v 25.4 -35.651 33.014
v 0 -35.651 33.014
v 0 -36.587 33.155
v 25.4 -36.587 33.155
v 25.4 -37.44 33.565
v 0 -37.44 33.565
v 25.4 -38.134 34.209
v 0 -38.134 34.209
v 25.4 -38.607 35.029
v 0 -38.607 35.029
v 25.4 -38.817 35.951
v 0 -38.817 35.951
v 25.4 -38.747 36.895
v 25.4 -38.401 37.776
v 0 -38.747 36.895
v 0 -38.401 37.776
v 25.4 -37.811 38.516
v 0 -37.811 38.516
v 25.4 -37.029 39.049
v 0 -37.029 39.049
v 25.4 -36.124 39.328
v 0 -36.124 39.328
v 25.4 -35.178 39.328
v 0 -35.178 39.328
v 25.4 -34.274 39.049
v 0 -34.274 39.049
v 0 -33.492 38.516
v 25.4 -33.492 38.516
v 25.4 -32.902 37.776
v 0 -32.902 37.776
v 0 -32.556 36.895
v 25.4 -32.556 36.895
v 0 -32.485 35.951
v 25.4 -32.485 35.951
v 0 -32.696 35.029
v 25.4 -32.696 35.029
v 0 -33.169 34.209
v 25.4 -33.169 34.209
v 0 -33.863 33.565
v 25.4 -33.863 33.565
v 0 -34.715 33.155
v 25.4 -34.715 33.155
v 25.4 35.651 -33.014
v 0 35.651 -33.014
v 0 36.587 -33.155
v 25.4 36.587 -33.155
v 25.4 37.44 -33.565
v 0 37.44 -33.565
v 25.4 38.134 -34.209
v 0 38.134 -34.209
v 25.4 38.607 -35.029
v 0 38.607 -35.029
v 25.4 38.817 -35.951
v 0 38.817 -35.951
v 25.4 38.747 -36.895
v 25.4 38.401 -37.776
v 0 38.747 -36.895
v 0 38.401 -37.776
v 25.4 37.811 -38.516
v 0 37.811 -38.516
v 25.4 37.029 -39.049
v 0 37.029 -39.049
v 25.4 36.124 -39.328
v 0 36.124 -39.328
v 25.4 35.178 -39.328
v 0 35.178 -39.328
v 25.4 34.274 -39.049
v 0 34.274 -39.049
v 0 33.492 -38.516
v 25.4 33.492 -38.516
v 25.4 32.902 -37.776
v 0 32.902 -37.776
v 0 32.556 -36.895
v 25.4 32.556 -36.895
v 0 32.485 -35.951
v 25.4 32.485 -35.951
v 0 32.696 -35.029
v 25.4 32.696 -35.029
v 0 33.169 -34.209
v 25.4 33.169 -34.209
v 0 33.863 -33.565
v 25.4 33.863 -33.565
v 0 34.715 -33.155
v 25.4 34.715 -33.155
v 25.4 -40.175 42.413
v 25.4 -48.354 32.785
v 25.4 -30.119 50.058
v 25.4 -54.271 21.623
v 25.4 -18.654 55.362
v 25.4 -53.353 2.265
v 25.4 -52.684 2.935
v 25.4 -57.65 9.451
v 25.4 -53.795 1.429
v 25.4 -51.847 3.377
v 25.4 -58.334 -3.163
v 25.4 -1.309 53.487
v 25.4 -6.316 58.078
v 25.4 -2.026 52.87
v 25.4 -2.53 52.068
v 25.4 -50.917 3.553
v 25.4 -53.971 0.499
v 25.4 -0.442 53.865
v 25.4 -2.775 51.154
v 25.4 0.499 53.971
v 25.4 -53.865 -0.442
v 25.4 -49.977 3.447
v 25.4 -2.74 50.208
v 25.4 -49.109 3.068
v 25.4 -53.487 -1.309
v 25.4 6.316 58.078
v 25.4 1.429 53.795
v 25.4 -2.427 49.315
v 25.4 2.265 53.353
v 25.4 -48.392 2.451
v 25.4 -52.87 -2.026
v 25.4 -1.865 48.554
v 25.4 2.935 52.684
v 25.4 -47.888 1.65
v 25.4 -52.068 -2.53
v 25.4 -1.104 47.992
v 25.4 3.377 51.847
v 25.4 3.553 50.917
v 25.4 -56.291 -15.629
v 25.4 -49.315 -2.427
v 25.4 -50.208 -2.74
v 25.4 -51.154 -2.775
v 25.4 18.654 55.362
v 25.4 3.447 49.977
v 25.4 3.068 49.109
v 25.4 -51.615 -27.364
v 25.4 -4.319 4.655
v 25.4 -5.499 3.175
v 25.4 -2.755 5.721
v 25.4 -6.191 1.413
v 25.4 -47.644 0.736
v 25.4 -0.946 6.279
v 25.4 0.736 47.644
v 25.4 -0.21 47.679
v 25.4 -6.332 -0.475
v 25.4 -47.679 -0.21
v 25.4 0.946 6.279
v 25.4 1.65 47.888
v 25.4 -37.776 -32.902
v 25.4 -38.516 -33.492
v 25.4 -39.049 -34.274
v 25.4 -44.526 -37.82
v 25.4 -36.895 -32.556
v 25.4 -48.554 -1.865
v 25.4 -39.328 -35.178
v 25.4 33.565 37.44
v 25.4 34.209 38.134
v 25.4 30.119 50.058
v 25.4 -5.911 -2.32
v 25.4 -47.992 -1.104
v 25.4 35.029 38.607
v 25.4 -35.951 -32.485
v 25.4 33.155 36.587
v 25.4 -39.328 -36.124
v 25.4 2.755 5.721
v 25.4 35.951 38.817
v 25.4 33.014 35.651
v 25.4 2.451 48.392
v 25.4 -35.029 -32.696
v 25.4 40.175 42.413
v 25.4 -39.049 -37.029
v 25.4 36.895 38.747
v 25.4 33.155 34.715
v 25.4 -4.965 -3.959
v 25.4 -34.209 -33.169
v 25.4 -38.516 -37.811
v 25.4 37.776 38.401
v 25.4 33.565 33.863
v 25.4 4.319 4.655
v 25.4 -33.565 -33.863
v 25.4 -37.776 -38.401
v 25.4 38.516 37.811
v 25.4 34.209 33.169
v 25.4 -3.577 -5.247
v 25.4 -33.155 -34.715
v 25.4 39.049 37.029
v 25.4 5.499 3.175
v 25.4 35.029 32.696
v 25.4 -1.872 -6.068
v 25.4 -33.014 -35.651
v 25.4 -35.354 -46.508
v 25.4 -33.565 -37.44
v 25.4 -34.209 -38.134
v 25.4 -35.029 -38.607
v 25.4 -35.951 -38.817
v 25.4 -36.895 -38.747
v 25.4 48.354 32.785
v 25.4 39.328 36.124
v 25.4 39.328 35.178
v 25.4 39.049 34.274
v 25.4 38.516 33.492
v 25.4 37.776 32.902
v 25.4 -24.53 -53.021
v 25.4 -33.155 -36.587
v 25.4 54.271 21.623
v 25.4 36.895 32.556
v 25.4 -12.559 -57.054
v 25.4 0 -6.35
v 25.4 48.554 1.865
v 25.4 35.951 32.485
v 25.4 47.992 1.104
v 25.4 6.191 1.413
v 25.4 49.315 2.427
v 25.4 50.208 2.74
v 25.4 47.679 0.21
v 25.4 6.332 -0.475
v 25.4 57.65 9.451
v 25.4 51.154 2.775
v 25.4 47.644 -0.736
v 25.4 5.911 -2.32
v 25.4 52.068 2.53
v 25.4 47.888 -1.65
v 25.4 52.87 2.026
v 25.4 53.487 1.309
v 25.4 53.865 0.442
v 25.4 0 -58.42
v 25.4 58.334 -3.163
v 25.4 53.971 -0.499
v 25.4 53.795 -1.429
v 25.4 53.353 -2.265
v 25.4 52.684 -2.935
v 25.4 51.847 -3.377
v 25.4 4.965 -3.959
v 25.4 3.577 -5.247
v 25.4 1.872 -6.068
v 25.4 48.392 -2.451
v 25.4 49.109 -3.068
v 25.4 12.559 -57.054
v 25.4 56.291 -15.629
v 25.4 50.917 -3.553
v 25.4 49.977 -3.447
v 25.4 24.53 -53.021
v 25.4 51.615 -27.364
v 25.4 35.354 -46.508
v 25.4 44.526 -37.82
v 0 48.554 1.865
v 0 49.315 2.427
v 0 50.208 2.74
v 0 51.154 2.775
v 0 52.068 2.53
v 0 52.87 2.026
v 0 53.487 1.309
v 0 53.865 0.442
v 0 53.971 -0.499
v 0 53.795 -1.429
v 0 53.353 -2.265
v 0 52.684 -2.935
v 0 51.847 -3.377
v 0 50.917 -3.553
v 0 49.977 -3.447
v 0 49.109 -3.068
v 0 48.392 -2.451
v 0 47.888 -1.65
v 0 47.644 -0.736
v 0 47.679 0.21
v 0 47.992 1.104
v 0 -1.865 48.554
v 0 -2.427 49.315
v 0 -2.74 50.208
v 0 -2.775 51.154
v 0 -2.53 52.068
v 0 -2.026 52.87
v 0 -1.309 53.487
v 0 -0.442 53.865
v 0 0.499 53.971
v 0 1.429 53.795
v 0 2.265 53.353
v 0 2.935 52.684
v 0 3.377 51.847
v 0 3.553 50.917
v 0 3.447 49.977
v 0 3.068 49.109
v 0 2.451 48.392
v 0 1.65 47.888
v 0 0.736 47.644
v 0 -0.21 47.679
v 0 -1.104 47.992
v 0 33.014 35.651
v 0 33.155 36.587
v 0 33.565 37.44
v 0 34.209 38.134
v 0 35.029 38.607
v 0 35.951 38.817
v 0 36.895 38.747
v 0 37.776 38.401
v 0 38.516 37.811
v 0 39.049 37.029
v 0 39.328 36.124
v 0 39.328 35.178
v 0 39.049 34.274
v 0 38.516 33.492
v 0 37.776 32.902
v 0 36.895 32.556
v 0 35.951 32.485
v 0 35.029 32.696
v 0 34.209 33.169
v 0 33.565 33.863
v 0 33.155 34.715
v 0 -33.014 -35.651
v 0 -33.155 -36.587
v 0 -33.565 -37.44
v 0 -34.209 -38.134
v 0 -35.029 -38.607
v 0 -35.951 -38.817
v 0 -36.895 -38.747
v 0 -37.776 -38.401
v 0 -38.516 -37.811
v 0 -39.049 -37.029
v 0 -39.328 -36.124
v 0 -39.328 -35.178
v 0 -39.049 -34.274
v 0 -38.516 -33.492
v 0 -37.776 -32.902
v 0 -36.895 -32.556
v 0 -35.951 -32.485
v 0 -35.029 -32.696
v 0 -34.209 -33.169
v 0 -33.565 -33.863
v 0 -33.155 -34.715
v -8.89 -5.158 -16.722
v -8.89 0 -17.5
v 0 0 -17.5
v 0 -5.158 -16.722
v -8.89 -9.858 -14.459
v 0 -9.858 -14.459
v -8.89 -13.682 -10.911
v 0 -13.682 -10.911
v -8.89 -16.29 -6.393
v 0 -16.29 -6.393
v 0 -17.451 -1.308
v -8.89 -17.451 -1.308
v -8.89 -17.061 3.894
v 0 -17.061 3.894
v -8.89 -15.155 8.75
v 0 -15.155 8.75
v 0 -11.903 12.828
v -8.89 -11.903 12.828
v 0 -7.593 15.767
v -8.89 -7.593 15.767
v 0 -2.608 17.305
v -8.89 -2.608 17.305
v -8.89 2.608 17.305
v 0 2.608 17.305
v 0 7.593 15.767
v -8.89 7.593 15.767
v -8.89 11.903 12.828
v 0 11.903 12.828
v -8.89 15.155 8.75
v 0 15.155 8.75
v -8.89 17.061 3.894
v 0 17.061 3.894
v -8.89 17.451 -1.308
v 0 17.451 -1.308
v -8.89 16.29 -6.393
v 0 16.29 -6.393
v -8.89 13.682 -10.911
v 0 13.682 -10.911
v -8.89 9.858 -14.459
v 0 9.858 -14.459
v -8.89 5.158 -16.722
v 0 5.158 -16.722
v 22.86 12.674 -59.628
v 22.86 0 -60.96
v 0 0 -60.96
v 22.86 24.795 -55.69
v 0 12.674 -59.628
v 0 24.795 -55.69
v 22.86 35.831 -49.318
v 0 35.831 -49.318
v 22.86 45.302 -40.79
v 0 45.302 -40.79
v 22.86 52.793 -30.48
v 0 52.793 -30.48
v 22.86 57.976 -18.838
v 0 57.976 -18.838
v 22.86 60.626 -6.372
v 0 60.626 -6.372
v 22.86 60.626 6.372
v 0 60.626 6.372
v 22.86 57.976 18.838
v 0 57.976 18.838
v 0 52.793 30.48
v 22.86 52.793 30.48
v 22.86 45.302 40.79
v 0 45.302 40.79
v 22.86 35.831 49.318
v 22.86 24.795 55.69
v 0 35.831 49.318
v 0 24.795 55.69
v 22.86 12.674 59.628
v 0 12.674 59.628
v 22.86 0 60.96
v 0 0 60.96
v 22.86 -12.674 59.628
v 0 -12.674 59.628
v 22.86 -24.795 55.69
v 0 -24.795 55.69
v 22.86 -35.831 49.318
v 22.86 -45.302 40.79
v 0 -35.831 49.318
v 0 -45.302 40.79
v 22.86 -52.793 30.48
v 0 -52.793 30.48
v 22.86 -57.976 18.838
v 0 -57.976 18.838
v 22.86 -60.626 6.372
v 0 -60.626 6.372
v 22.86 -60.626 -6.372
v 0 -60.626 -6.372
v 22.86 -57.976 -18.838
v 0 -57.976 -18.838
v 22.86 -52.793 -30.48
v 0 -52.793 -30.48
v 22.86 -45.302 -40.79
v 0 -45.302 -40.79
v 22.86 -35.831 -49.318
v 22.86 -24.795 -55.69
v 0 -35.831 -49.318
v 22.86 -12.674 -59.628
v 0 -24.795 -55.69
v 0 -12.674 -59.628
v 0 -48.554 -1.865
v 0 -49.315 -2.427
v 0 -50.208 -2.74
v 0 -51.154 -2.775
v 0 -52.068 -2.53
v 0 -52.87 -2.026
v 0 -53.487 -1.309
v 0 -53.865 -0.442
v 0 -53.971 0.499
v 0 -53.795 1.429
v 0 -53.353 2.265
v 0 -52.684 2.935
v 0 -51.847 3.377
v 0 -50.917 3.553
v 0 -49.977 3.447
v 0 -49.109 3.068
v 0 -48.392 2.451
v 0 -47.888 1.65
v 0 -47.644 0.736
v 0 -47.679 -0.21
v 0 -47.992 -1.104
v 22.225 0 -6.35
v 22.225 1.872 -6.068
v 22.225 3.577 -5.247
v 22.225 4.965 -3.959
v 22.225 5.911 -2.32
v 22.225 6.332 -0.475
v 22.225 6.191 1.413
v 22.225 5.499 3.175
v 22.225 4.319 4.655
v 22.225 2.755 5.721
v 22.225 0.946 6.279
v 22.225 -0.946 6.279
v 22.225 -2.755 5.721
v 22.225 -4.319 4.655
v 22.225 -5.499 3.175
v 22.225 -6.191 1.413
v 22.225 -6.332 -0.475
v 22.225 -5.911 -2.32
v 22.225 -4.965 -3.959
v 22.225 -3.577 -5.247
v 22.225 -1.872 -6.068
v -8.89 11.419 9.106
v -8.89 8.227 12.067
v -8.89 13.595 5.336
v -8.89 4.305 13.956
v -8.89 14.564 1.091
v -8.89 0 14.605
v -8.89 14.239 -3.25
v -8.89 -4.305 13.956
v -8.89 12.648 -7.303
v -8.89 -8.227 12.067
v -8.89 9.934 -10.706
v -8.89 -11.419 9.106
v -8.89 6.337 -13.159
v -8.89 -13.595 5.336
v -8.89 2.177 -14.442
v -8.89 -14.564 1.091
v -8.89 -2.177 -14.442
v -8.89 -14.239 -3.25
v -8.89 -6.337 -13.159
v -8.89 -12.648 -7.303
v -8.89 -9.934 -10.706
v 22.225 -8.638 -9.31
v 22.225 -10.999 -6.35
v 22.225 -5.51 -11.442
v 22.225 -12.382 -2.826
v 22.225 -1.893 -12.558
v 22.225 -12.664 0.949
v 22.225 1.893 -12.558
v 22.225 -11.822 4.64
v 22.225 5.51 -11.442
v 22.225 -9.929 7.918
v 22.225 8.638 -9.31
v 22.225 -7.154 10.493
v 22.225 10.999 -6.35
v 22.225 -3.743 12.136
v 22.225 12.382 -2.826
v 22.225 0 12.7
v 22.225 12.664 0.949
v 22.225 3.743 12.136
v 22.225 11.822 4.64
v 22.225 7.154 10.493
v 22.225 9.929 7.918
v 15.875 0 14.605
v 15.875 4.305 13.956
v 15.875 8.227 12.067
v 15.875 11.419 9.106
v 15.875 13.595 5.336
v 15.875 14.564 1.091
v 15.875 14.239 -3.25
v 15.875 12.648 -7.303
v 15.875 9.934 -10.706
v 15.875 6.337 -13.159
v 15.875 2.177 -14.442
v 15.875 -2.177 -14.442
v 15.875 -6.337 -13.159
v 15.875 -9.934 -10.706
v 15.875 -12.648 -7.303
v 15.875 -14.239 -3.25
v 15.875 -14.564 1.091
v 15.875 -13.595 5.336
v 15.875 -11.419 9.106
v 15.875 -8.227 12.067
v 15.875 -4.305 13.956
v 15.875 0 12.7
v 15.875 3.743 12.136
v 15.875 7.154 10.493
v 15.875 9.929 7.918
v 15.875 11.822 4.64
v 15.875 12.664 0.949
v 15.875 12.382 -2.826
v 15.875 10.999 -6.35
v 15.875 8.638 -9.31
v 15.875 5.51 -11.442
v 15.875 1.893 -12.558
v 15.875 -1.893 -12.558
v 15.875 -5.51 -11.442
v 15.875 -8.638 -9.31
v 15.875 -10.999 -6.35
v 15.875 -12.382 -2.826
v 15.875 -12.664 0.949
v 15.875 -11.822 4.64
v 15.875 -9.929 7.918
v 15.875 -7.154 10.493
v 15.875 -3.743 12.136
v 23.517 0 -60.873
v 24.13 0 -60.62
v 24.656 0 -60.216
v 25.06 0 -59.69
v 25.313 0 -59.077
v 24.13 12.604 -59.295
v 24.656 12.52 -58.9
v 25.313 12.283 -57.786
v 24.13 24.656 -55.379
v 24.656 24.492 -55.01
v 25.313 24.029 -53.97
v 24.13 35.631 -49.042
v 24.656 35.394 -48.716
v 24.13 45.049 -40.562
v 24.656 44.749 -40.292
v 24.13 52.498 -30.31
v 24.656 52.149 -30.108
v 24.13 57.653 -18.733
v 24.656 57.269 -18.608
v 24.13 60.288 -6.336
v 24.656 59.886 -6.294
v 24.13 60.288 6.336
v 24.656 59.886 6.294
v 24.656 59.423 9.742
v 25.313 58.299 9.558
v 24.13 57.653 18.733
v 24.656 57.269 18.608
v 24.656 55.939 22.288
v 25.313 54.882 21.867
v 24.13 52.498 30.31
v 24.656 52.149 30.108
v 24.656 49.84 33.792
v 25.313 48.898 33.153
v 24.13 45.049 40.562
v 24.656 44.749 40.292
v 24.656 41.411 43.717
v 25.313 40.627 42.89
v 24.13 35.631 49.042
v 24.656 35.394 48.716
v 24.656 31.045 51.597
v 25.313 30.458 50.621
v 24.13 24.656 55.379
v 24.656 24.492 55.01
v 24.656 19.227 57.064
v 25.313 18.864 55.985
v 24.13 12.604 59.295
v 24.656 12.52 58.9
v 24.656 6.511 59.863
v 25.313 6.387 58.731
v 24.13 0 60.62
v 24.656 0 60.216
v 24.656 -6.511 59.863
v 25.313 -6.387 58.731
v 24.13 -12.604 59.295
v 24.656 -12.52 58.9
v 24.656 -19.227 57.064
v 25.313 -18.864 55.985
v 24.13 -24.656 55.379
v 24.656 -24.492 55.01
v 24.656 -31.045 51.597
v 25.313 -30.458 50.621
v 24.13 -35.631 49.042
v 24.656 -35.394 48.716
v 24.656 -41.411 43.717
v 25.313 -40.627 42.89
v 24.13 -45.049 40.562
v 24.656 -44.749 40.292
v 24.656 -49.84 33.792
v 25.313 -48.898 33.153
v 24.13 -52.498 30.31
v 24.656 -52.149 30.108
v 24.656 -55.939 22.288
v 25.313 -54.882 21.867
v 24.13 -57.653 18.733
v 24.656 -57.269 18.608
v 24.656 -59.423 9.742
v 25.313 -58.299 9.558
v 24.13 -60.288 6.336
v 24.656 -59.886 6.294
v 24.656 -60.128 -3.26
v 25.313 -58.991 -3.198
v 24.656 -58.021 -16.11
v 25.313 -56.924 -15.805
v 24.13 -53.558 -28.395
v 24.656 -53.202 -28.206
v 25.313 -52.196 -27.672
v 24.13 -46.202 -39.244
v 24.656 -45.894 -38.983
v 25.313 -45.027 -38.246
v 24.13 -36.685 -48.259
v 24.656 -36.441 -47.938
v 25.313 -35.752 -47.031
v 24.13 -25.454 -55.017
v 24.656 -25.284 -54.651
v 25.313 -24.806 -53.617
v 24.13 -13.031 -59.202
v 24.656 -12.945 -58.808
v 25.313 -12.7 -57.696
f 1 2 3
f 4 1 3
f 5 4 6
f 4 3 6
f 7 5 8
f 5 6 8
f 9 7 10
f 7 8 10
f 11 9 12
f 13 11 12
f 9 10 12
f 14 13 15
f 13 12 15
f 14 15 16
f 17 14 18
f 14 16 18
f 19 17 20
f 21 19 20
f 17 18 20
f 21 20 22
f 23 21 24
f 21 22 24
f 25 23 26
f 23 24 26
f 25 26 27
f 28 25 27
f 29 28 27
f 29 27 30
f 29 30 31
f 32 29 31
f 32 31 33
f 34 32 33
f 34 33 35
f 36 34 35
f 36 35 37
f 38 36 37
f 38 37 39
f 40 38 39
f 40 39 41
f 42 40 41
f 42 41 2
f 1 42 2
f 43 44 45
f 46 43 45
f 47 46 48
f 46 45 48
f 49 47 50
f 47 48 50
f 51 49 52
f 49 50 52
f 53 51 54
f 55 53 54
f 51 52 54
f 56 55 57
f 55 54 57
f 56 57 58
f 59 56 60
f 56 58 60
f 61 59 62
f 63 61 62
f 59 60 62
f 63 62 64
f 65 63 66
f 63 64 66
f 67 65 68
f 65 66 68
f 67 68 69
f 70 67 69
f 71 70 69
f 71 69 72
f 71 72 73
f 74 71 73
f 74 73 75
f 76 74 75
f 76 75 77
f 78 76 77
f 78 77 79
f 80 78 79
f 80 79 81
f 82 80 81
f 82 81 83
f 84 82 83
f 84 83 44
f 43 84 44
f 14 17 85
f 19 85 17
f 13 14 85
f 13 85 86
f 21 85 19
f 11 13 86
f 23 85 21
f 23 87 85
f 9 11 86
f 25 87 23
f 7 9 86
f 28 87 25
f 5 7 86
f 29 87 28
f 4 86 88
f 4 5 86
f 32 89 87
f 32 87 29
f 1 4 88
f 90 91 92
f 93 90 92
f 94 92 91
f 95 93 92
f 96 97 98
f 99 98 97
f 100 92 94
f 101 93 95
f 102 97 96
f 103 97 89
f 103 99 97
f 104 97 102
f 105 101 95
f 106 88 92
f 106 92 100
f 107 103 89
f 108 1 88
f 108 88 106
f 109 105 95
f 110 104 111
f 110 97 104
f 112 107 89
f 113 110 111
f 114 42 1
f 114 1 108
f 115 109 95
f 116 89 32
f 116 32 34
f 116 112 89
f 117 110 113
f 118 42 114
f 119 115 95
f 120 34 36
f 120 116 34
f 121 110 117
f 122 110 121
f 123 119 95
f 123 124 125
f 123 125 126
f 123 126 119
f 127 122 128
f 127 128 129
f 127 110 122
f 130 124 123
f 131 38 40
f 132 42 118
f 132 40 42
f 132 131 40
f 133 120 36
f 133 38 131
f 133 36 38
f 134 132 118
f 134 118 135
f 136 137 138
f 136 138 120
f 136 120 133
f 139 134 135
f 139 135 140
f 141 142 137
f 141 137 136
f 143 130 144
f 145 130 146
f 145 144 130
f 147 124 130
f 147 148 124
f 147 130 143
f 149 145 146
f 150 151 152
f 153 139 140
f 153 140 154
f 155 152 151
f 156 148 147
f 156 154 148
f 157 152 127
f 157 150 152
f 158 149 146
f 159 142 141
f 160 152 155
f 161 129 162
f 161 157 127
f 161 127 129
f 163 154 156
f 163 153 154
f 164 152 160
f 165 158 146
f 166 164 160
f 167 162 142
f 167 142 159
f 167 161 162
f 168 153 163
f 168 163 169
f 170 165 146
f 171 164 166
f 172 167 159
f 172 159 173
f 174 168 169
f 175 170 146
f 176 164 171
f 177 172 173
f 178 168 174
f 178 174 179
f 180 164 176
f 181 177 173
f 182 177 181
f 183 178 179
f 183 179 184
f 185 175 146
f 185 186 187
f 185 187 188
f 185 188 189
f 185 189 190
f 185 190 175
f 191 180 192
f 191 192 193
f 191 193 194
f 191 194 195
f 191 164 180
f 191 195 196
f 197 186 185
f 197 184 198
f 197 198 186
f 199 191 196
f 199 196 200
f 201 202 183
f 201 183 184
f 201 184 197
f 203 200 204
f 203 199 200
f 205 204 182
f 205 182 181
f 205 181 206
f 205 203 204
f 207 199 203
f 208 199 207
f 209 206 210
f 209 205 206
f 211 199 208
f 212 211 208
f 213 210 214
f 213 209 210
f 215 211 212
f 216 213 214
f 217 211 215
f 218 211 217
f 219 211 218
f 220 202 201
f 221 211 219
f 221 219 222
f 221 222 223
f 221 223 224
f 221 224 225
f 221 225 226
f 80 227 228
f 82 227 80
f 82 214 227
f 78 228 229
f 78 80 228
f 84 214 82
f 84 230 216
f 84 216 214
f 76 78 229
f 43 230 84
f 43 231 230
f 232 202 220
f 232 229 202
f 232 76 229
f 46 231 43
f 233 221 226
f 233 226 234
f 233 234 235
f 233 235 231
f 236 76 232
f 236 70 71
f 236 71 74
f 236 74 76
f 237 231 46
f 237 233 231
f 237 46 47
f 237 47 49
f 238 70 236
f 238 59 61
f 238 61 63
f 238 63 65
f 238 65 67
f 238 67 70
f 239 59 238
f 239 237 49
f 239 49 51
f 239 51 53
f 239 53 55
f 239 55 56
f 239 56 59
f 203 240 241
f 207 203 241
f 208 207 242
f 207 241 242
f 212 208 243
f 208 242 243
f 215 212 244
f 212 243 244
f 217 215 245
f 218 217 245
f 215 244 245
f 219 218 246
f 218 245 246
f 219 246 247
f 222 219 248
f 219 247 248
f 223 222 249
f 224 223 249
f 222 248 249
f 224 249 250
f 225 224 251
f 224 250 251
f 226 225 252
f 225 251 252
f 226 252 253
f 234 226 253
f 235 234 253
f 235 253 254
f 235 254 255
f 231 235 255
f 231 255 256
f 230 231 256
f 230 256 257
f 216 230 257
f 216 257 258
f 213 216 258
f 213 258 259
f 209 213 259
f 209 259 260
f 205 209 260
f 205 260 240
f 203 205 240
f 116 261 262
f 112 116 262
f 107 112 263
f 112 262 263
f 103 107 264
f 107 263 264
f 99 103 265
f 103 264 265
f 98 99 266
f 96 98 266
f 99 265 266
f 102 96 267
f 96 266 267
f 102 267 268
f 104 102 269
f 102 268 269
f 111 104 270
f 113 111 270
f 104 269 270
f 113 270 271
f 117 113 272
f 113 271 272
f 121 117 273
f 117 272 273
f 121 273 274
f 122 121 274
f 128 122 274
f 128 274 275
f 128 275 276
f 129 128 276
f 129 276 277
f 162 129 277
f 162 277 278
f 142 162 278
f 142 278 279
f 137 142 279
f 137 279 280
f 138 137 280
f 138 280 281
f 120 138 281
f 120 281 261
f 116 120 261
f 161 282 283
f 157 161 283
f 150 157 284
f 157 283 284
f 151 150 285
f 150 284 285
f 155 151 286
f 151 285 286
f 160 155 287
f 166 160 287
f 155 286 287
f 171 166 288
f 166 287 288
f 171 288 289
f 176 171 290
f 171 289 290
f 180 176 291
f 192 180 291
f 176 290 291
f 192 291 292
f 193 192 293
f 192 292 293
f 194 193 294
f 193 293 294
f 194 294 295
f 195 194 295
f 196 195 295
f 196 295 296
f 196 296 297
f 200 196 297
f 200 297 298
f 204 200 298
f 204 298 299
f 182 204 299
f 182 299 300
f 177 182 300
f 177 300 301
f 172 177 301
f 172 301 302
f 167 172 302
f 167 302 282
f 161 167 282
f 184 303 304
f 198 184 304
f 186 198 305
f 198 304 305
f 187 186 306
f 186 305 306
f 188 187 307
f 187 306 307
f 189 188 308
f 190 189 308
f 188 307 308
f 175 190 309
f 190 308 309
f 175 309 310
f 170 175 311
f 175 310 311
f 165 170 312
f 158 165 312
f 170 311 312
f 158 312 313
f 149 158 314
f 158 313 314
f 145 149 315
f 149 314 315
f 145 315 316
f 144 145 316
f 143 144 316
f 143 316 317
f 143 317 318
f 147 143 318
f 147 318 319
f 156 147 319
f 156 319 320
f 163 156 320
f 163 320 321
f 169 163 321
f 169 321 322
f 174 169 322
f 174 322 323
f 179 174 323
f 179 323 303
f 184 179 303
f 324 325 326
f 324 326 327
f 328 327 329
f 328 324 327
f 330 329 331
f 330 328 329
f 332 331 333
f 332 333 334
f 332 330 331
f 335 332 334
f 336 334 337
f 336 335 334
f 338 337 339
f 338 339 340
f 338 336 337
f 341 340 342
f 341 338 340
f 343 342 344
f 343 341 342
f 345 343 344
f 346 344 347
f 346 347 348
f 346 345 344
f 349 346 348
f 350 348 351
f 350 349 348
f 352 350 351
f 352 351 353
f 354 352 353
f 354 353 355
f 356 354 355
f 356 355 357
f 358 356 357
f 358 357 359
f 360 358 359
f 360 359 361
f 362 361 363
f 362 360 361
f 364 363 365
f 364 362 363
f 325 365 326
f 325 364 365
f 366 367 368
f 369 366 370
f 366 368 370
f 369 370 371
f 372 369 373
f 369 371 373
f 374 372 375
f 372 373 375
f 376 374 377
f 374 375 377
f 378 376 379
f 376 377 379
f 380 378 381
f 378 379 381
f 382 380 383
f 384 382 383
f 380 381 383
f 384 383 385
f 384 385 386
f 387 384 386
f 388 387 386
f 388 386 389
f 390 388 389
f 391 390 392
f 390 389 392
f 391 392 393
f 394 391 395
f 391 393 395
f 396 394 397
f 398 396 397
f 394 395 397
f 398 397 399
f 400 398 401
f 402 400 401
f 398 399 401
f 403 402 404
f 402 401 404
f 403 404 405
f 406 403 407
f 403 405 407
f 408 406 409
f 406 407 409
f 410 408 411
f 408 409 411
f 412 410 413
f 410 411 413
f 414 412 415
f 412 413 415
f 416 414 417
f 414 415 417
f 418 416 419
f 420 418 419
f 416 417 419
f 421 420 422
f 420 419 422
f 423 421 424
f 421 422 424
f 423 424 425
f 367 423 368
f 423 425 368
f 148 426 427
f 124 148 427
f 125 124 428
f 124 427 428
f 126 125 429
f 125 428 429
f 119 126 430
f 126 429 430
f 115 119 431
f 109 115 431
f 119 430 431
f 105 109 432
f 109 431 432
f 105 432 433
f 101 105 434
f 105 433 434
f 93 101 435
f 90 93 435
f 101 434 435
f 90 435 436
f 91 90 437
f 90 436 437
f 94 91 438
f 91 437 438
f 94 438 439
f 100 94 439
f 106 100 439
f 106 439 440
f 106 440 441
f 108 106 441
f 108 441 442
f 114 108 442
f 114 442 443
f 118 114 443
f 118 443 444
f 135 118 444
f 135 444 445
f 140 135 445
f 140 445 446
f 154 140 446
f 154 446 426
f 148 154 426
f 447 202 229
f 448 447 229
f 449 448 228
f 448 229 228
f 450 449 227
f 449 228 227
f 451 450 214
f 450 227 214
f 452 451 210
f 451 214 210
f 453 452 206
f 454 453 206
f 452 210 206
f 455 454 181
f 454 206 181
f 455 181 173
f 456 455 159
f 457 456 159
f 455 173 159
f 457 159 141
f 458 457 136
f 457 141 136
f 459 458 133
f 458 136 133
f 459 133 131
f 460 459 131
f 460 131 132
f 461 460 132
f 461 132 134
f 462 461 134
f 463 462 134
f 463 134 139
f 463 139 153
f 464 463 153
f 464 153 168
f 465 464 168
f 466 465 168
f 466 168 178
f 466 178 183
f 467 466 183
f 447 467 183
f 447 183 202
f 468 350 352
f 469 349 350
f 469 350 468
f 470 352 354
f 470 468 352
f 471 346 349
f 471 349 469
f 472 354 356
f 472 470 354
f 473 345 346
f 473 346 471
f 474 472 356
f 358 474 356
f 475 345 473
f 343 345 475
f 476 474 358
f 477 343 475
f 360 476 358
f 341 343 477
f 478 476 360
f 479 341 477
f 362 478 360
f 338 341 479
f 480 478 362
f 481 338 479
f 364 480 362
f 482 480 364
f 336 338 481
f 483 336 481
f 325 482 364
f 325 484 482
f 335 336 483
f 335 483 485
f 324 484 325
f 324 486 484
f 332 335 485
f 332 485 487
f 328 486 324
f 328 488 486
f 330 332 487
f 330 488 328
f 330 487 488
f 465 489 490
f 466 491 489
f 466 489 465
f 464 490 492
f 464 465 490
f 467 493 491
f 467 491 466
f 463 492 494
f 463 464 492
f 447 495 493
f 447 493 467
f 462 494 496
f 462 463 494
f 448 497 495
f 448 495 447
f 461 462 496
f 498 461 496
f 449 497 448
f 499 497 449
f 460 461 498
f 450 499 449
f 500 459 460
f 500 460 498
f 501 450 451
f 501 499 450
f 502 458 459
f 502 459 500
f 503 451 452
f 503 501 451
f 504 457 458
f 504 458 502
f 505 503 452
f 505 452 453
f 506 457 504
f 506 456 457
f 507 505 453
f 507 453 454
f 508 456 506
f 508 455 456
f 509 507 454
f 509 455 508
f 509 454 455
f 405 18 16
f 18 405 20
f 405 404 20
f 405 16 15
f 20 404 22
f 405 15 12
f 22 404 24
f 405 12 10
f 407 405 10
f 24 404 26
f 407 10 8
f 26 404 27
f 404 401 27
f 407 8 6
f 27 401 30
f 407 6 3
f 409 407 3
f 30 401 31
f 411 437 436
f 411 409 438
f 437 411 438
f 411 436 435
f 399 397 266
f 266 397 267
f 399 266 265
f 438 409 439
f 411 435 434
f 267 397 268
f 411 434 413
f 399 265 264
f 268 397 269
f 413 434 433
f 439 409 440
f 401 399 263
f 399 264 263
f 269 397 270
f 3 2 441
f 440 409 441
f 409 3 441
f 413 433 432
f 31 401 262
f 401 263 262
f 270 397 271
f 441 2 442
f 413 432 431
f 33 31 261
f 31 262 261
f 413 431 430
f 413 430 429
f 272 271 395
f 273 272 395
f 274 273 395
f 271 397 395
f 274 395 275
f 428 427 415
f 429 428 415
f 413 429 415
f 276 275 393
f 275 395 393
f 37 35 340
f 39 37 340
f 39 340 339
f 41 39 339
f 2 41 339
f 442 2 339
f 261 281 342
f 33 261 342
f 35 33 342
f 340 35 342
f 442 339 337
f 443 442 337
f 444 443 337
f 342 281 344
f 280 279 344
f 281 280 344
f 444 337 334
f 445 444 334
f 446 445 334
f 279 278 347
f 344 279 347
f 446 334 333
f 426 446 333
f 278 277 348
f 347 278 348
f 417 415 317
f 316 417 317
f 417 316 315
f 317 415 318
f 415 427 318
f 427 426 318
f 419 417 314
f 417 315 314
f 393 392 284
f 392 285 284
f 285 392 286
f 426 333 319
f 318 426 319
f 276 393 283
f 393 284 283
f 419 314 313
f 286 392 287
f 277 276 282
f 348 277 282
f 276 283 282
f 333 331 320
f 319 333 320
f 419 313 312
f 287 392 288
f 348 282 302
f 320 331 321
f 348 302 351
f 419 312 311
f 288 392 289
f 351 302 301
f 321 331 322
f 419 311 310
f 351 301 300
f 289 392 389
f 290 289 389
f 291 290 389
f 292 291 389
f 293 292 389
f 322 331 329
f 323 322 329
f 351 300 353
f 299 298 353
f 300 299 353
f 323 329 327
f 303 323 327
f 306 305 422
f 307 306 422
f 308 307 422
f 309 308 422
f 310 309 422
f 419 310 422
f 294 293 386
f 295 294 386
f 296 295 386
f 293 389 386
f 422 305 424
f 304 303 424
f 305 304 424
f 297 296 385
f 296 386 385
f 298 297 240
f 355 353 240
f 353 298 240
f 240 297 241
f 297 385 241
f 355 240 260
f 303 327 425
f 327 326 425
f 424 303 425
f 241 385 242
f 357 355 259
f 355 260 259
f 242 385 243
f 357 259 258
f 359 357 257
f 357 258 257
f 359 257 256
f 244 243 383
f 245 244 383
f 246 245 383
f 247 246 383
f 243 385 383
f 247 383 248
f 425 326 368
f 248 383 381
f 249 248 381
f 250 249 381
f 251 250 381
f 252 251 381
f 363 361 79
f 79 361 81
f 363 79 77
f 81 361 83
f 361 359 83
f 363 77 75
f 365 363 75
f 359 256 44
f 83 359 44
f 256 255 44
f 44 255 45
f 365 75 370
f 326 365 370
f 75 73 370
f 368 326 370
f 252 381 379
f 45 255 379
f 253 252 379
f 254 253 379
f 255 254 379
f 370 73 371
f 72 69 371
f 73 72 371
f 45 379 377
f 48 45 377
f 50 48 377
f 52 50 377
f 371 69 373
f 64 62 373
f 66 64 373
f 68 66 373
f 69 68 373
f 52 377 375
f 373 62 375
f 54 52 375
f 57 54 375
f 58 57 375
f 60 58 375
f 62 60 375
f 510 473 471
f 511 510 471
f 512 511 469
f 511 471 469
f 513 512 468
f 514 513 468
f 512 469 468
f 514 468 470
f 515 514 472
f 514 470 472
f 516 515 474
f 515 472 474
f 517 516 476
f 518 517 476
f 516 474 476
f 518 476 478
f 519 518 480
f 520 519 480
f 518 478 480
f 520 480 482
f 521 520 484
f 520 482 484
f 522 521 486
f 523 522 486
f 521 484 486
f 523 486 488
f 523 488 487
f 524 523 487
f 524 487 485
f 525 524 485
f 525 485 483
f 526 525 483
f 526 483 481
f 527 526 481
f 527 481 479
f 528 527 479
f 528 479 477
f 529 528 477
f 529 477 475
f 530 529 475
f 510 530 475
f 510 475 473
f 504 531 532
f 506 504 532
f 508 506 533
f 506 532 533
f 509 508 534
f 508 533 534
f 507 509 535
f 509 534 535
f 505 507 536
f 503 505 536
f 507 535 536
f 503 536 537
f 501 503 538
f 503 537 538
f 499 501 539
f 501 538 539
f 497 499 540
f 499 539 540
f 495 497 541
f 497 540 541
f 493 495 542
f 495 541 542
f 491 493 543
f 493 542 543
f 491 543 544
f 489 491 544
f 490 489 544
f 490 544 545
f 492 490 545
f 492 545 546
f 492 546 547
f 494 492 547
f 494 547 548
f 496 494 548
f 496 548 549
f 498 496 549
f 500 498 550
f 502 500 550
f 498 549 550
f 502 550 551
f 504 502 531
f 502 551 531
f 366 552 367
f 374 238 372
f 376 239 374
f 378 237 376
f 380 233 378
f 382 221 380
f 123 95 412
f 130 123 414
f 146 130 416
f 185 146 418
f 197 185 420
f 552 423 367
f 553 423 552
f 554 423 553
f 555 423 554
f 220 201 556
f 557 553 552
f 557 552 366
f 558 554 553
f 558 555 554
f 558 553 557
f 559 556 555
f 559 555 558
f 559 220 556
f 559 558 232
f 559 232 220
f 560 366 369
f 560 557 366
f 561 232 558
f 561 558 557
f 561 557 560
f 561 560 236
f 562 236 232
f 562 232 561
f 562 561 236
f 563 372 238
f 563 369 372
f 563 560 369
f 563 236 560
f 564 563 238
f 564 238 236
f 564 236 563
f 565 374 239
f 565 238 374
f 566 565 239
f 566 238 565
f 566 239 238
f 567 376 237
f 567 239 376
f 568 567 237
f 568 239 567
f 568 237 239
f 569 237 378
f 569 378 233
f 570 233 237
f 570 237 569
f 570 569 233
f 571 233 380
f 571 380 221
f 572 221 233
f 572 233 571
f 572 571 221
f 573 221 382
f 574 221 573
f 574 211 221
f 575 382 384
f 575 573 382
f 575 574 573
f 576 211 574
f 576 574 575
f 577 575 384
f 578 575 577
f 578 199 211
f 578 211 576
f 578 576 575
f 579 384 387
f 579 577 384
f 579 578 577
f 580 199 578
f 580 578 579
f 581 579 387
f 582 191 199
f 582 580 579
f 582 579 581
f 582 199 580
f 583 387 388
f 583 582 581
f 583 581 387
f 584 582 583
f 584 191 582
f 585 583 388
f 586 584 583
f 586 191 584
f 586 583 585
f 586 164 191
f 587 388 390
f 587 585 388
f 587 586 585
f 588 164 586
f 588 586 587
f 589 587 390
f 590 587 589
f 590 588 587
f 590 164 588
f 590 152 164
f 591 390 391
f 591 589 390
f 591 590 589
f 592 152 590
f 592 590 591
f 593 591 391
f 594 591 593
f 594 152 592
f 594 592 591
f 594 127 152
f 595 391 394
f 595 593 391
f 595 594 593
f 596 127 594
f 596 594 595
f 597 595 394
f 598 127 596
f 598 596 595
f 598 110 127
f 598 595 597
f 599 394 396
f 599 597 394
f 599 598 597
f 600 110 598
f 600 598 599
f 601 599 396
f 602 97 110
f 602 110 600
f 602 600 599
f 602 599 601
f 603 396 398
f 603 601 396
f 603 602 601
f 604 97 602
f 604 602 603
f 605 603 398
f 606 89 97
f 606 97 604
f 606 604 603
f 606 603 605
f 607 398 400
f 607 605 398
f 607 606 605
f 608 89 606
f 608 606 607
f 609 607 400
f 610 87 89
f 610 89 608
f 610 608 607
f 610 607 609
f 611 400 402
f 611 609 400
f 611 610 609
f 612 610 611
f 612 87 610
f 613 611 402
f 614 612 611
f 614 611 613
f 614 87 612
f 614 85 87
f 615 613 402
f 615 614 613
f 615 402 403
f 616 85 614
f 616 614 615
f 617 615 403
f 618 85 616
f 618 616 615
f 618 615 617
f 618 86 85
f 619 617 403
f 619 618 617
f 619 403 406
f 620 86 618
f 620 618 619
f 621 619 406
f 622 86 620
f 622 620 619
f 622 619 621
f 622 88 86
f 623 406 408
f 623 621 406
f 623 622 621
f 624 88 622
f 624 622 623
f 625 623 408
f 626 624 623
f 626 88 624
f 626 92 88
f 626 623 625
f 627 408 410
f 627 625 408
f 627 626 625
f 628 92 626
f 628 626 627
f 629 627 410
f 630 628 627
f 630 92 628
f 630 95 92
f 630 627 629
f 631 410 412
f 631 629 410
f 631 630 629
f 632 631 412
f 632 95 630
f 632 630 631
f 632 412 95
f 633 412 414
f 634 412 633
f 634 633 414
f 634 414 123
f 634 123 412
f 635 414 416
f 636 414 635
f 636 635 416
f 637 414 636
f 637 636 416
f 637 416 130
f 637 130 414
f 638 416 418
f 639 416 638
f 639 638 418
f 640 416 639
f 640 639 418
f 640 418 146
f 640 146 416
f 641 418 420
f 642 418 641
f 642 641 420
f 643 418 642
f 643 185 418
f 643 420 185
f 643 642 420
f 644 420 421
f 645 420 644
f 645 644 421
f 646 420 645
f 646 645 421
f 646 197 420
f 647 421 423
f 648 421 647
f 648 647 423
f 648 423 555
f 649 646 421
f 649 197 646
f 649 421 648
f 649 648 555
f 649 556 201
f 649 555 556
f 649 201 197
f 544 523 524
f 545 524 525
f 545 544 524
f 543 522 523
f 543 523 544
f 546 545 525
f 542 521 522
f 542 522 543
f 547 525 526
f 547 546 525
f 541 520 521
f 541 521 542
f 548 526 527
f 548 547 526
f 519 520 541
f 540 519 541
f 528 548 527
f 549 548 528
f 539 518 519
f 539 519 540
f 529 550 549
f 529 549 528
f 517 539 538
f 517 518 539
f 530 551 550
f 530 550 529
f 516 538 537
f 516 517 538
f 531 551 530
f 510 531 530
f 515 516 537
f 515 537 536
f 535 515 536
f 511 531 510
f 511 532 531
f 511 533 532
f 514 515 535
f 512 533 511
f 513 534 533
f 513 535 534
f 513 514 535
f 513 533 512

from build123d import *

# Parameters (mm, degrees)
SKETCH1_R           = 60.96
BOSS_EXTRUDE1_DEPTH = 25.4
FILLET1_R           = 2.54
SKETCH2_R           = 4.508
CUT_EXTRUDE1_DEPTH  = 6.35
SKETCH4_R           = 6.35
CUT_EXTRUDE3_DEPTH  = 90.874374546
SKETCH5_R           = 3.175
CUT_EXTRUDE4_DEPTH  = 90.874374546
CIRPATTERN2_COUNT   = 8
SKETCH6_R           = 14.605
CUT_EXTRUDE5_DEPTH  = 22.225
BOSS_EXTRUDE2_START = 6.35
SKETCH7_R           = 14.605
SKETCH7_R_2         = 12.7
BOSS_EXTRUDE2_DEPTH = 6.35
BOSS_EXTRUDE3_START = 8.89
SKETCH8_R           = 17.499965
SKETCH8_R_2         = 14.605
BOSS_EXTRUDE3_DEPTH = 8.89


with BuildPart() as part:
    # Sketch1 → Boss-Extrude1 (new body)
    with BuildSketch(Plane(origin=(0, 0, 0), x_dir=(0, 0, -1), z_dir=(1, 0, 0))):
        Circle(SKETCH1_R)
    extrude(amount=BOSS_EXTRUDE1_DEPTH)

    # Fillet1
    fillet1_edges = [part.edges().sort_by_distance(p)[0] for p in [
        (25.4, 0, 60.96),
    ]]
    fillet(fillet1_edges, radius=FILLET1_R)

    # Sketch2 → Cut-Extrude1 (cut)
    with BuildSketch(Plane(origin=(25.4, 0, 0), x_dir=(0, 0, -1), z_dir=(1, 0, 0))):
        Circle(SKETCH2_R)
    extrude(amount=-CUT_EXTRUDE1_DEPTH, mode=Mode.SUBTRACT)

    # Sketch4 → Cut-Extrude3 (cut, through all)
    with BuildSketch(Plane(origin=(25.4, 0, 0), x_dir=(0, 0, -1), z_dir=(1, 0, 0))):
        Circle(SKETCH4_R)
    extrude(amount=-CUT_EXTRUDE3_DEPTH, mode=Mode.SUBTRACT)

    # Sketch5 → Cut-Extrude4 (cut, through all)
    with BuildSketch(Plane.ZY):
        with Locations((-36.188764222, 35.651274088)):
            Circle(SKETCH5_R)
    cut_extrude4 = extrude(amount=-CUT_EXTRUDE4_DEPTH, mode=Mode.SUBTRACT)

    # CirPattern2: Cut-Extrude4 ×8 about axis, 1 skipped
    cirpattern2_axis = Axis((0, 0, 0), (1, 0, 0))
    add([cut_extrude4.rotate(cirpattern2_axis, i * 360 / CIRPATTERN2_COUNT) for i in range(1, CIRPATTERN2_COUNT) if i not in (7,)], mode=Mode.SUBTRACT)

    # Sketch6 → Cut-Extrude5 (cut)
    with BuildSketch(Plane.ZY):
        Circle(SKETCH6_R)
    extrude(amount=-CUT_EXTRUDE5_DEPTH, mode=Mode.SUBTRACT)

    # Sketch7 → Boss-Extrude2 (add)
    with BuildSketch(Plane.ZY.offset(-22.225).offset(BOSS_EXTRUDE2_START)):
        Circle(SKETCH7_R)
        Circle(SKETCH7_R_2, mode=Mode.SUBTRACT)
    extrude(amount=-BOSS_EXTRUDE2_DEPTH)

    # Sketch8 → Boss-Extrude3 (add)
    with BuildSketch(Plane.ZY.offset(BOSS_EXTRUDE3_START)):
        with Locations(Location((0, 0, 0), (0, 0, 180))):
            Circle(SKETCH8_R)
        Circle(SKETCH8_R_2, mode=Mode.SUBTRACT)
    extrude(amount=-BOSS_EXTRUDE3_DEPTH)


solid = part.part
